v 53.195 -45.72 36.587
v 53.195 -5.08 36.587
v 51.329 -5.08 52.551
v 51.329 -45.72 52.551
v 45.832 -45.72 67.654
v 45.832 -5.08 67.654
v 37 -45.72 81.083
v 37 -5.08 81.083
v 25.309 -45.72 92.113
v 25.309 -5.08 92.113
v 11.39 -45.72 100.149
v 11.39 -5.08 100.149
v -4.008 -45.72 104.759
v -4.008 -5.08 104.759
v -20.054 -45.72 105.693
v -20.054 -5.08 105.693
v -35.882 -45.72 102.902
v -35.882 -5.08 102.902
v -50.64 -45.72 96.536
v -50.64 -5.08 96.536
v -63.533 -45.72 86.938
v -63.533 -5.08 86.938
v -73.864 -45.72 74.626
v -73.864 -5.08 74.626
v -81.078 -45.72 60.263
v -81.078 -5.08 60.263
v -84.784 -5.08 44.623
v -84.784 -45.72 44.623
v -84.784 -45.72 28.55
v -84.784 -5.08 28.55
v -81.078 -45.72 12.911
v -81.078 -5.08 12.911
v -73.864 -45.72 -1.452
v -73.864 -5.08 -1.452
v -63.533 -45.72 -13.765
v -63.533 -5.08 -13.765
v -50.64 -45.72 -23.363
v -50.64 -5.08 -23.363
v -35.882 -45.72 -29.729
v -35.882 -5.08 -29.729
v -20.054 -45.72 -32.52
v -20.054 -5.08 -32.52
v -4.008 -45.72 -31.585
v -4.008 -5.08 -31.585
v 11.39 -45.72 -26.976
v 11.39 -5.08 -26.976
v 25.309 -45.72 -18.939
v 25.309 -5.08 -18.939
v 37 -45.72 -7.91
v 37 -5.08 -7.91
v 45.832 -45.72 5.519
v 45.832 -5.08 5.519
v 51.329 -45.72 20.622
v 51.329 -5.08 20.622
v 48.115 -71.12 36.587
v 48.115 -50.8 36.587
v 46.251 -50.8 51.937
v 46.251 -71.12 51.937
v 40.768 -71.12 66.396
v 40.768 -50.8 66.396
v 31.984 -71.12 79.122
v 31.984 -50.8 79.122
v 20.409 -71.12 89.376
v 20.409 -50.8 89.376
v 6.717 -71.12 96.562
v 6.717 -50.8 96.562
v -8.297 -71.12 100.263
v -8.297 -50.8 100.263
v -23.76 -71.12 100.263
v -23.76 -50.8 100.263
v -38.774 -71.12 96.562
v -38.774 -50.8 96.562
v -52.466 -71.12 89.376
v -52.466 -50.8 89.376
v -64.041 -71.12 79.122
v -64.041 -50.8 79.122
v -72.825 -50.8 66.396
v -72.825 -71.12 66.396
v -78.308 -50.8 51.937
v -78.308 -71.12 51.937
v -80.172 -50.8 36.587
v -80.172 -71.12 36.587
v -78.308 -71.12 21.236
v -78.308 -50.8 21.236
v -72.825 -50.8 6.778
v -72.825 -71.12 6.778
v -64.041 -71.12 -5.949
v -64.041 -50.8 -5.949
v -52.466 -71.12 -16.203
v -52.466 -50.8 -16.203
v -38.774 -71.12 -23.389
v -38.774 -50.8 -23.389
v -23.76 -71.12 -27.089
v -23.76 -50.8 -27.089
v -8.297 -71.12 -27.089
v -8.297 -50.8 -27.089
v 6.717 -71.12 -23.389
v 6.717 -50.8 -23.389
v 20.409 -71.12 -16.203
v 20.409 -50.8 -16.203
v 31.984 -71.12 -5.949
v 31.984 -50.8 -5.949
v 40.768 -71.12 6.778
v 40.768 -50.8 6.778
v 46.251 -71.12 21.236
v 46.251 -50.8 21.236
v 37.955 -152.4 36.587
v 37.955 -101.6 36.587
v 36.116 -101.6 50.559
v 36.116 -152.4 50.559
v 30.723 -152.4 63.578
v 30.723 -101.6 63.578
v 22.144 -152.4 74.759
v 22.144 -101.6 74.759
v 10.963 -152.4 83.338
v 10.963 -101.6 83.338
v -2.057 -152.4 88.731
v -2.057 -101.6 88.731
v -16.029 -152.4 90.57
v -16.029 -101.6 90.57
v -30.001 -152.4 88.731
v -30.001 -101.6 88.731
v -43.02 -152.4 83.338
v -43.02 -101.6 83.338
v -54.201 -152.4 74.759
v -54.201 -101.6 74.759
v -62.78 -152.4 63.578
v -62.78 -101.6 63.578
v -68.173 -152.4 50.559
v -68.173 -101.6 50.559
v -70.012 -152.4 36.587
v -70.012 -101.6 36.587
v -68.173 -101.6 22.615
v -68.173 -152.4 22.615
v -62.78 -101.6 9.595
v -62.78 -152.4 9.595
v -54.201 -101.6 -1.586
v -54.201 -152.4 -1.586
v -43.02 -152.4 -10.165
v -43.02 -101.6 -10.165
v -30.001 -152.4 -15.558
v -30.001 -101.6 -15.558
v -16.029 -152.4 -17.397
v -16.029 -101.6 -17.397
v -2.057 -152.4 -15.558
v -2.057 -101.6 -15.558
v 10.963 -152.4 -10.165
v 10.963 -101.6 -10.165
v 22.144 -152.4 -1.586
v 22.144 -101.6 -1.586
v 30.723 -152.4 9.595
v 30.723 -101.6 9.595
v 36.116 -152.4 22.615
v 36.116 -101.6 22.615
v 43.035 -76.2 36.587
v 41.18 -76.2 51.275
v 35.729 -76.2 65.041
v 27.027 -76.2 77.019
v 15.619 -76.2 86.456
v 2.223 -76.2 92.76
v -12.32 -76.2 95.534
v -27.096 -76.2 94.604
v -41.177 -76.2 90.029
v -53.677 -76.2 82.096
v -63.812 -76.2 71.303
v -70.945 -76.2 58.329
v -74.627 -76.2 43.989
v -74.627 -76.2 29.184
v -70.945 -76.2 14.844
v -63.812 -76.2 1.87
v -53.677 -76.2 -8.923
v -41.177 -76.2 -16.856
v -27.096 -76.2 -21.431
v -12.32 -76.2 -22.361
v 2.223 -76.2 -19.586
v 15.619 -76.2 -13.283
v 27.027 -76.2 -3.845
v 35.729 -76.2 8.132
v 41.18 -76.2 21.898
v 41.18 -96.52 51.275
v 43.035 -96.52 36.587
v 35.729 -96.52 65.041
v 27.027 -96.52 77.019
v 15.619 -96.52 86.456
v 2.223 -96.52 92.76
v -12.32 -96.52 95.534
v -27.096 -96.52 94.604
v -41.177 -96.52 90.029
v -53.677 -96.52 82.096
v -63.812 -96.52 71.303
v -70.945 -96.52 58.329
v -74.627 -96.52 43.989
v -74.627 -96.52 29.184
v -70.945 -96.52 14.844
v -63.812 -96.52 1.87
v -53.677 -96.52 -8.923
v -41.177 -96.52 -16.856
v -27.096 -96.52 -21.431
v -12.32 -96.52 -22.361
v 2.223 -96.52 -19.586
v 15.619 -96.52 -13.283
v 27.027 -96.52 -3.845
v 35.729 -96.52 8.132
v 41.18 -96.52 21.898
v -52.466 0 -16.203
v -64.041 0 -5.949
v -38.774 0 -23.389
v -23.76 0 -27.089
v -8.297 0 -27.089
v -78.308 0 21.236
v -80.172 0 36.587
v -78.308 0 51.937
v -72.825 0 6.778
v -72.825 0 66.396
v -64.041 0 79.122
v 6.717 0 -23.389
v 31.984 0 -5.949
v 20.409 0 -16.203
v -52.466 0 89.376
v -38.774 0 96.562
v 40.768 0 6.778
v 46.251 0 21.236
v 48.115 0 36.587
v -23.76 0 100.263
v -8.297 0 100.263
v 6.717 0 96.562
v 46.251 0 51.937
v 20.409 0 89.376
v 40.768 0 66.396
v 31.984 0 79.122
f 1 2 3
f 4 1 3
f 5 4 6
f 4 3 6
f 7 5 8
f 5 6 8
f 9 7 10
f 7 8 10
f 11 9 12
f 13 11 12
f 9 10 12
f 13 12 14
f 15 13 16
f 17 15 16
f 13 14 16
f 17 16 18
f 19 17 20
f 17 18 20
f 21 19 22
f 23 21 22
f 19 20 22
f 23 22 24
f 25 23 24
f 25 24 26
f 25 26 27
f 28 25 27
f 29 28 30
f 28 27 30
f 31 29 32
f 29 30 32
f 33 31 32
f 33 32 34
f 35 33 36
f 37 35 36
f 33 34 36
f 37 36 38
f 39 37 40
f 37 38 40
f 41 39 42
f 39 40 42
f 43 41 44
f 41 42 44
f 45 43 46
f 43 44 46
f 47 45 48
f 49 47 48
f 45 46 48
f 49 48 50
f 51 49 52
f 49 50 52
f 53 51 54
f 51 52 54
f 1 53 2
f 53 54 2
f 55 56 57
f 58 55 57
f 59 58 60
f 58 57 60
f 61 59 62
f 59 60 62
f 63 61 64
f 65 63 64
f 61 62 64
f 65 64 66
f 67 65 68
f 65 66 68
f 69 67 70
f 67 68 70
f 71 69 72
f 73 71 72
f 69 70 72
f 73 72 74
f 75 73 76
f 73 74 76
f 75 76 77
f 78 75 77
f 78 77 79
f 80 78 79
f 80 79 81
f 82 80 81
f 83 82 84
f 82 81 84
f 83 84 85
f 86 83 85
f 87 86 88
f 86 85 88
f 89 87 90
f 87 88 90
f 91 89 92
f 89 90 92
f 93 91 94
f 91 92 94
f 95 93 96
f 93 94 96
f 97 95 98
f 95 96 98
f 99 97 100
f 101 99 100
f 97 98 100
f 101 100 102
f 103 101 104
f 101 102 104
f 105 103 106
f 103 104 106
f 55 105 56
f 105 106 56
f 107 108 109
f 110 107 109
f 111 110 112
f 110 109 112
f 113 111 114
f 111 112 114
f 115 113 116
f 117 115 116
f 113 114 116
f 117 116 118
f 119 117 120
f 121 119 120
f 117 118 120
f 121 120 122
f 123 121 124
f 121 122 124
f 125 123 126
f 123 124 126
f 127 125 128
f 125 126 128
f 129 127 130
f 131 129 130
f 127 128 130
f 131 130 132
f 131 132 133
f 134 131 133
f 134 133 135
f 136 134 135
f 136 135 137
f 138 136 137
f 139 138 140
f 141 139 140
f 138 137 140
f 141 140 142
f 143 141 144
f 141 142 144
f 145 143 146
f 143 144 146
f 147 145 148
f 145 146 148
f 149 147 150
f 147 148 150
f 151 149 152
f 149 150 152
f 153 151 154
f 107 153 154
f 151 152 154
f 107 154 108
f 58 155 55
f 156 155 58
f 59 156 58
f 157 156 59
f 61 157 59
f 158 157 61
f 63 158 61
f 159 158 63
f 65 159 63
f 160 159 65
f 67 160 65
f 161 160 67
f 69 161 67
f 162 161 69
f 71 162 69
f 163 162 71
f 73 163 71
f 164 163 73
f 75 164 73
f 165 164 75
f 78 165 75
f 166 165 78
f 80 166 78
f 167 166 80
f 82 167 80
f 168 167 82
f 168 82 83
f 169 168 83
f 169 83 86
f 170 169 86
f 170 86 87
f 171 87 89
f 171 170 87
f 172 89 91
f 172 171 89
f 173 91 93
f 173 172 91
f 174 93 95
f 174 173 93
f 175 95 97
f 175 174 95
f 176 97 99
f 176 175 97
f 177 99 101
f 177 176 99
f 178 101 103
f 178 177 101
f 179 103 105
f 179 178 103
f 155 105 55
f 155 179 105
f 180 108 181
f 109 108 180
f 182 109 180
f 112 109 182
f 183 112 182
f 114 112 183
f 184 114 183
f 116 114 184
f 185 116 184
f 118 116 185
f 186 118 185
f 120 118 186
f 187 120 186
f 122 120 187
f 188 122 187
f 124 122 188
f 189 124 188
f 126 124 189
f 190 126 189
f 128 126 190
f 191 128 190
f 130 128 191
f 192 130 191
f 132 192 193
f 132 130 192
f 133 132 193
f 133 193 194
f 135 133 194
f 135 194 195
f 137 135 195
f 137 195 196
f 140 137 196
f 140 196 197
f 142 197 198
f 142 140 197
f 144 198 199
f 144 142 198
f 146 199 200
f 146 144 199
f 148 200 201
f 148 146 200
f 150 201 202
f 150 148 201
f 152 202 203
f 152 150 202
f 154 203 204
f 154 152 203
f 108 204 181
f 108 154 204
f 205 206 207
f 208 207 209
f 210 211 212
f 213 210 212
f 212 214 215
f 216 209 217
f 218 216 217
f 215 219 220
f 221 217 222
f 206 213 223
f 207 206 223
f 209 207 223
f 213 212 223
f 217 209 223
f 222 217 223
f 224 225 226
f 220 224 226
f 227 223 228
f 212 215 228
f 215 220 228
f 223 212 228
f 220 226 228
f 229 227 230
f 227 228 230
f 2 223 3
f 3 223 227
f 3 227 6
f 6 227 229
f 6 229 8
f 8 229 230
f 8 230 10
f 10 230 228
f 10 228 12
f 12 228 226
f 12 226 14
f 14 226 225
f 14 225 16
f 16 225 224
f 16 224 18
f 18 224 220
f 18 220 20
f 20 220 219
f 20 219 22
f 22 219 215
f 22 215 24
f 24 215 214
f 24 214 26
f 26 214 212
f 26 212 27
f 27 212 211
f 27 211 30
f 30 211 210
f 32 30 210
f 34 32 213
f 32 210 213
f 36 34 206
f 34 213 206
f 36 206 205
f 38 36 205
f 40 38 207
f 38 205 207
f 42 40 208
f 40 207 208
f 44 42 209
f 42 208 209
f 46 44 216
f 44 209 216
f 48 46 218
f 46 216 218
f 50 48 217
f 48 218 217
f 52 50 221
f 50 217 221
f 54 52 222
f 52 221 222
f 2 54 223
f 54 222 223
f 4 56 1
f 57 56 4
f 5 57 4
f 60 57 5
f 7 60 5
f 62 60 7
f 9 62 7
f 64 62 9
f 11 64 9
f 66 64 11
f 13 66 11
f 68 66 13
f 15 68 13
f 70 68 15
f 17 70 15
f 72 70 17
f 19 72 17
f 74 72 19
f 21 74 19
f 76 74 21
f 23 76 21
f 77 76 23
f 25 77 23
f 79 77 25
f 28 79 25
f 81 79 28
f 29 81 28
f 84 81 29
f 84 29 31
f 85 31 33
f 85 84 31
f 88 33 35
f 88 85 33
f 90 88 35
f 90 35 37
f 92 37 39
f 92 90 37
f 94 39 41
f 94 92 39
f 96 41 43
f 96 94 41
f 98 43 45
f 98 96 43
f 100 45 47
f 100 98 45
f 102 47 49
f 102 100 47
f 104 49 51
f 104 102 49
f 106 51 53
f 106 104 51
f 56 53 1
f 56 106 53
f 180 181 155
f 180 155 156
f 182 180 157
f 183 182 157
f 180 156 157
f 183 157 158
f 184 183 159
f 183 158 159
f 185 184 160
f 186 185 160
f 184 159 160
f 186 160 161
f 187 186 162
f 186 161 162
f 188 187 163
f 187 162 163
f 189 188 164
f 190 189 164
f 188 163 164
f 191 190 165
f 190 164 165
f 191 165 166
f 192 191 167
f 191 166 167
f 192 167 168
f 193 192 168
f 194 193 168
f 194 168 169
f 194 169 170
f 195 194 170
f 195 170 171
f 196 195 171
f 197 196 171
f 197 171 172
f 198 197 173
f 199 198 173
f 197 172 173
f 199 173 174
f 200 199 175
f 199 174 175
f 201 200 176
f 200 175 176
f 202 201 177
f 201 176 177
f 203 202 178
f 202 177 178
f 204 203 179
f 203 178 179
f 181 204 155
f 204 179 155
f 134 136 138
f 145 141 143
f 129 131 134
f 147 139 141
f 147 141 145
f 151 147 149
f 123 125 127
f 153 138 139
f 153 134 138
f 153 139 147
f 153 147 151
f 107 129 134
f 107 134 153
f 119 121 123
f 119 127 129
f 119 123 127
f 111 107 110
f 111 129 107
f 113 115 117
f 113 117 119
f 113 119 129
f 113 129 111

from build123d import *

# Parameters (mm, degrees)
F0_R     = 69.2237369755
F1_DEPTH = 50.8
F2_SIZE  = 5.08
F3_DEPTH = 25.4
F4_SIZE  = 5.08
F5_DEPTH = 25.4
F6_SIZE  = 5.08
F7_DEPTH = 50.8


with BuildPart() as f1:
    # F0 (on Front) → F1 (new body)
    with BuildSketch(Plane.XZ):
        with Locations((-16.0285290331, 36.5865901113)):
            Circle(F0_R)
    extrude(amount=F1_DEPTH)

    # F2
    f2_edges = [f1.edges().sort_by_distance(p)[0] for p in [
        (53.195208, -25.4, 36.58659),
        (-85.252266, 0, 36.58659),
        (-85.252266, -50.8, 36.58659),
    ]]
    chamfer(f2_edges, length=F2_SIZE)

    # F3 (add): a face of the model
    f3_faces = [f1.faces().sort_by_distance(p)[0] for p in [
        (-16.0285290331, -50.8, 36.5865901113),
    ]]
    extrude(f3_faces, amount=F3_DEPTH)

    # F4
    f4_edges = [f1.edges().sort_by_distance(p)[0] for p in [
        (-80.172266, -76.2, 36.58659),
    ]]
    chamfer(f4_edges, length=F4_SIZE)

    # F5 (add): a face of the model
    f5_faces = [f1.faces().sort_by_distance(p)[0] for p in [
        (-16.0285290331, -76.2, 36.5865901113),
    ]]
    extrude(f5_faces, amount=F5_DEPTH)

    # F6
    f6_edges = [f1.edges().sort_by_distance(p)[0] for p in [
        (-75.092266, -101.6, 36.58659),
    ]]
    chamfer(f6_edges, length=F6_SIZE)

    # F7 (add): a face of the model
    f7_faces = [f1.faces().sort_by_distance(p)[0] for p in [
        (-16.0285290331, -101.6, 36.5865901113),
    ]]
    extrude(f7_faces, amount=F7_DEPTH)


solid = f1.part
